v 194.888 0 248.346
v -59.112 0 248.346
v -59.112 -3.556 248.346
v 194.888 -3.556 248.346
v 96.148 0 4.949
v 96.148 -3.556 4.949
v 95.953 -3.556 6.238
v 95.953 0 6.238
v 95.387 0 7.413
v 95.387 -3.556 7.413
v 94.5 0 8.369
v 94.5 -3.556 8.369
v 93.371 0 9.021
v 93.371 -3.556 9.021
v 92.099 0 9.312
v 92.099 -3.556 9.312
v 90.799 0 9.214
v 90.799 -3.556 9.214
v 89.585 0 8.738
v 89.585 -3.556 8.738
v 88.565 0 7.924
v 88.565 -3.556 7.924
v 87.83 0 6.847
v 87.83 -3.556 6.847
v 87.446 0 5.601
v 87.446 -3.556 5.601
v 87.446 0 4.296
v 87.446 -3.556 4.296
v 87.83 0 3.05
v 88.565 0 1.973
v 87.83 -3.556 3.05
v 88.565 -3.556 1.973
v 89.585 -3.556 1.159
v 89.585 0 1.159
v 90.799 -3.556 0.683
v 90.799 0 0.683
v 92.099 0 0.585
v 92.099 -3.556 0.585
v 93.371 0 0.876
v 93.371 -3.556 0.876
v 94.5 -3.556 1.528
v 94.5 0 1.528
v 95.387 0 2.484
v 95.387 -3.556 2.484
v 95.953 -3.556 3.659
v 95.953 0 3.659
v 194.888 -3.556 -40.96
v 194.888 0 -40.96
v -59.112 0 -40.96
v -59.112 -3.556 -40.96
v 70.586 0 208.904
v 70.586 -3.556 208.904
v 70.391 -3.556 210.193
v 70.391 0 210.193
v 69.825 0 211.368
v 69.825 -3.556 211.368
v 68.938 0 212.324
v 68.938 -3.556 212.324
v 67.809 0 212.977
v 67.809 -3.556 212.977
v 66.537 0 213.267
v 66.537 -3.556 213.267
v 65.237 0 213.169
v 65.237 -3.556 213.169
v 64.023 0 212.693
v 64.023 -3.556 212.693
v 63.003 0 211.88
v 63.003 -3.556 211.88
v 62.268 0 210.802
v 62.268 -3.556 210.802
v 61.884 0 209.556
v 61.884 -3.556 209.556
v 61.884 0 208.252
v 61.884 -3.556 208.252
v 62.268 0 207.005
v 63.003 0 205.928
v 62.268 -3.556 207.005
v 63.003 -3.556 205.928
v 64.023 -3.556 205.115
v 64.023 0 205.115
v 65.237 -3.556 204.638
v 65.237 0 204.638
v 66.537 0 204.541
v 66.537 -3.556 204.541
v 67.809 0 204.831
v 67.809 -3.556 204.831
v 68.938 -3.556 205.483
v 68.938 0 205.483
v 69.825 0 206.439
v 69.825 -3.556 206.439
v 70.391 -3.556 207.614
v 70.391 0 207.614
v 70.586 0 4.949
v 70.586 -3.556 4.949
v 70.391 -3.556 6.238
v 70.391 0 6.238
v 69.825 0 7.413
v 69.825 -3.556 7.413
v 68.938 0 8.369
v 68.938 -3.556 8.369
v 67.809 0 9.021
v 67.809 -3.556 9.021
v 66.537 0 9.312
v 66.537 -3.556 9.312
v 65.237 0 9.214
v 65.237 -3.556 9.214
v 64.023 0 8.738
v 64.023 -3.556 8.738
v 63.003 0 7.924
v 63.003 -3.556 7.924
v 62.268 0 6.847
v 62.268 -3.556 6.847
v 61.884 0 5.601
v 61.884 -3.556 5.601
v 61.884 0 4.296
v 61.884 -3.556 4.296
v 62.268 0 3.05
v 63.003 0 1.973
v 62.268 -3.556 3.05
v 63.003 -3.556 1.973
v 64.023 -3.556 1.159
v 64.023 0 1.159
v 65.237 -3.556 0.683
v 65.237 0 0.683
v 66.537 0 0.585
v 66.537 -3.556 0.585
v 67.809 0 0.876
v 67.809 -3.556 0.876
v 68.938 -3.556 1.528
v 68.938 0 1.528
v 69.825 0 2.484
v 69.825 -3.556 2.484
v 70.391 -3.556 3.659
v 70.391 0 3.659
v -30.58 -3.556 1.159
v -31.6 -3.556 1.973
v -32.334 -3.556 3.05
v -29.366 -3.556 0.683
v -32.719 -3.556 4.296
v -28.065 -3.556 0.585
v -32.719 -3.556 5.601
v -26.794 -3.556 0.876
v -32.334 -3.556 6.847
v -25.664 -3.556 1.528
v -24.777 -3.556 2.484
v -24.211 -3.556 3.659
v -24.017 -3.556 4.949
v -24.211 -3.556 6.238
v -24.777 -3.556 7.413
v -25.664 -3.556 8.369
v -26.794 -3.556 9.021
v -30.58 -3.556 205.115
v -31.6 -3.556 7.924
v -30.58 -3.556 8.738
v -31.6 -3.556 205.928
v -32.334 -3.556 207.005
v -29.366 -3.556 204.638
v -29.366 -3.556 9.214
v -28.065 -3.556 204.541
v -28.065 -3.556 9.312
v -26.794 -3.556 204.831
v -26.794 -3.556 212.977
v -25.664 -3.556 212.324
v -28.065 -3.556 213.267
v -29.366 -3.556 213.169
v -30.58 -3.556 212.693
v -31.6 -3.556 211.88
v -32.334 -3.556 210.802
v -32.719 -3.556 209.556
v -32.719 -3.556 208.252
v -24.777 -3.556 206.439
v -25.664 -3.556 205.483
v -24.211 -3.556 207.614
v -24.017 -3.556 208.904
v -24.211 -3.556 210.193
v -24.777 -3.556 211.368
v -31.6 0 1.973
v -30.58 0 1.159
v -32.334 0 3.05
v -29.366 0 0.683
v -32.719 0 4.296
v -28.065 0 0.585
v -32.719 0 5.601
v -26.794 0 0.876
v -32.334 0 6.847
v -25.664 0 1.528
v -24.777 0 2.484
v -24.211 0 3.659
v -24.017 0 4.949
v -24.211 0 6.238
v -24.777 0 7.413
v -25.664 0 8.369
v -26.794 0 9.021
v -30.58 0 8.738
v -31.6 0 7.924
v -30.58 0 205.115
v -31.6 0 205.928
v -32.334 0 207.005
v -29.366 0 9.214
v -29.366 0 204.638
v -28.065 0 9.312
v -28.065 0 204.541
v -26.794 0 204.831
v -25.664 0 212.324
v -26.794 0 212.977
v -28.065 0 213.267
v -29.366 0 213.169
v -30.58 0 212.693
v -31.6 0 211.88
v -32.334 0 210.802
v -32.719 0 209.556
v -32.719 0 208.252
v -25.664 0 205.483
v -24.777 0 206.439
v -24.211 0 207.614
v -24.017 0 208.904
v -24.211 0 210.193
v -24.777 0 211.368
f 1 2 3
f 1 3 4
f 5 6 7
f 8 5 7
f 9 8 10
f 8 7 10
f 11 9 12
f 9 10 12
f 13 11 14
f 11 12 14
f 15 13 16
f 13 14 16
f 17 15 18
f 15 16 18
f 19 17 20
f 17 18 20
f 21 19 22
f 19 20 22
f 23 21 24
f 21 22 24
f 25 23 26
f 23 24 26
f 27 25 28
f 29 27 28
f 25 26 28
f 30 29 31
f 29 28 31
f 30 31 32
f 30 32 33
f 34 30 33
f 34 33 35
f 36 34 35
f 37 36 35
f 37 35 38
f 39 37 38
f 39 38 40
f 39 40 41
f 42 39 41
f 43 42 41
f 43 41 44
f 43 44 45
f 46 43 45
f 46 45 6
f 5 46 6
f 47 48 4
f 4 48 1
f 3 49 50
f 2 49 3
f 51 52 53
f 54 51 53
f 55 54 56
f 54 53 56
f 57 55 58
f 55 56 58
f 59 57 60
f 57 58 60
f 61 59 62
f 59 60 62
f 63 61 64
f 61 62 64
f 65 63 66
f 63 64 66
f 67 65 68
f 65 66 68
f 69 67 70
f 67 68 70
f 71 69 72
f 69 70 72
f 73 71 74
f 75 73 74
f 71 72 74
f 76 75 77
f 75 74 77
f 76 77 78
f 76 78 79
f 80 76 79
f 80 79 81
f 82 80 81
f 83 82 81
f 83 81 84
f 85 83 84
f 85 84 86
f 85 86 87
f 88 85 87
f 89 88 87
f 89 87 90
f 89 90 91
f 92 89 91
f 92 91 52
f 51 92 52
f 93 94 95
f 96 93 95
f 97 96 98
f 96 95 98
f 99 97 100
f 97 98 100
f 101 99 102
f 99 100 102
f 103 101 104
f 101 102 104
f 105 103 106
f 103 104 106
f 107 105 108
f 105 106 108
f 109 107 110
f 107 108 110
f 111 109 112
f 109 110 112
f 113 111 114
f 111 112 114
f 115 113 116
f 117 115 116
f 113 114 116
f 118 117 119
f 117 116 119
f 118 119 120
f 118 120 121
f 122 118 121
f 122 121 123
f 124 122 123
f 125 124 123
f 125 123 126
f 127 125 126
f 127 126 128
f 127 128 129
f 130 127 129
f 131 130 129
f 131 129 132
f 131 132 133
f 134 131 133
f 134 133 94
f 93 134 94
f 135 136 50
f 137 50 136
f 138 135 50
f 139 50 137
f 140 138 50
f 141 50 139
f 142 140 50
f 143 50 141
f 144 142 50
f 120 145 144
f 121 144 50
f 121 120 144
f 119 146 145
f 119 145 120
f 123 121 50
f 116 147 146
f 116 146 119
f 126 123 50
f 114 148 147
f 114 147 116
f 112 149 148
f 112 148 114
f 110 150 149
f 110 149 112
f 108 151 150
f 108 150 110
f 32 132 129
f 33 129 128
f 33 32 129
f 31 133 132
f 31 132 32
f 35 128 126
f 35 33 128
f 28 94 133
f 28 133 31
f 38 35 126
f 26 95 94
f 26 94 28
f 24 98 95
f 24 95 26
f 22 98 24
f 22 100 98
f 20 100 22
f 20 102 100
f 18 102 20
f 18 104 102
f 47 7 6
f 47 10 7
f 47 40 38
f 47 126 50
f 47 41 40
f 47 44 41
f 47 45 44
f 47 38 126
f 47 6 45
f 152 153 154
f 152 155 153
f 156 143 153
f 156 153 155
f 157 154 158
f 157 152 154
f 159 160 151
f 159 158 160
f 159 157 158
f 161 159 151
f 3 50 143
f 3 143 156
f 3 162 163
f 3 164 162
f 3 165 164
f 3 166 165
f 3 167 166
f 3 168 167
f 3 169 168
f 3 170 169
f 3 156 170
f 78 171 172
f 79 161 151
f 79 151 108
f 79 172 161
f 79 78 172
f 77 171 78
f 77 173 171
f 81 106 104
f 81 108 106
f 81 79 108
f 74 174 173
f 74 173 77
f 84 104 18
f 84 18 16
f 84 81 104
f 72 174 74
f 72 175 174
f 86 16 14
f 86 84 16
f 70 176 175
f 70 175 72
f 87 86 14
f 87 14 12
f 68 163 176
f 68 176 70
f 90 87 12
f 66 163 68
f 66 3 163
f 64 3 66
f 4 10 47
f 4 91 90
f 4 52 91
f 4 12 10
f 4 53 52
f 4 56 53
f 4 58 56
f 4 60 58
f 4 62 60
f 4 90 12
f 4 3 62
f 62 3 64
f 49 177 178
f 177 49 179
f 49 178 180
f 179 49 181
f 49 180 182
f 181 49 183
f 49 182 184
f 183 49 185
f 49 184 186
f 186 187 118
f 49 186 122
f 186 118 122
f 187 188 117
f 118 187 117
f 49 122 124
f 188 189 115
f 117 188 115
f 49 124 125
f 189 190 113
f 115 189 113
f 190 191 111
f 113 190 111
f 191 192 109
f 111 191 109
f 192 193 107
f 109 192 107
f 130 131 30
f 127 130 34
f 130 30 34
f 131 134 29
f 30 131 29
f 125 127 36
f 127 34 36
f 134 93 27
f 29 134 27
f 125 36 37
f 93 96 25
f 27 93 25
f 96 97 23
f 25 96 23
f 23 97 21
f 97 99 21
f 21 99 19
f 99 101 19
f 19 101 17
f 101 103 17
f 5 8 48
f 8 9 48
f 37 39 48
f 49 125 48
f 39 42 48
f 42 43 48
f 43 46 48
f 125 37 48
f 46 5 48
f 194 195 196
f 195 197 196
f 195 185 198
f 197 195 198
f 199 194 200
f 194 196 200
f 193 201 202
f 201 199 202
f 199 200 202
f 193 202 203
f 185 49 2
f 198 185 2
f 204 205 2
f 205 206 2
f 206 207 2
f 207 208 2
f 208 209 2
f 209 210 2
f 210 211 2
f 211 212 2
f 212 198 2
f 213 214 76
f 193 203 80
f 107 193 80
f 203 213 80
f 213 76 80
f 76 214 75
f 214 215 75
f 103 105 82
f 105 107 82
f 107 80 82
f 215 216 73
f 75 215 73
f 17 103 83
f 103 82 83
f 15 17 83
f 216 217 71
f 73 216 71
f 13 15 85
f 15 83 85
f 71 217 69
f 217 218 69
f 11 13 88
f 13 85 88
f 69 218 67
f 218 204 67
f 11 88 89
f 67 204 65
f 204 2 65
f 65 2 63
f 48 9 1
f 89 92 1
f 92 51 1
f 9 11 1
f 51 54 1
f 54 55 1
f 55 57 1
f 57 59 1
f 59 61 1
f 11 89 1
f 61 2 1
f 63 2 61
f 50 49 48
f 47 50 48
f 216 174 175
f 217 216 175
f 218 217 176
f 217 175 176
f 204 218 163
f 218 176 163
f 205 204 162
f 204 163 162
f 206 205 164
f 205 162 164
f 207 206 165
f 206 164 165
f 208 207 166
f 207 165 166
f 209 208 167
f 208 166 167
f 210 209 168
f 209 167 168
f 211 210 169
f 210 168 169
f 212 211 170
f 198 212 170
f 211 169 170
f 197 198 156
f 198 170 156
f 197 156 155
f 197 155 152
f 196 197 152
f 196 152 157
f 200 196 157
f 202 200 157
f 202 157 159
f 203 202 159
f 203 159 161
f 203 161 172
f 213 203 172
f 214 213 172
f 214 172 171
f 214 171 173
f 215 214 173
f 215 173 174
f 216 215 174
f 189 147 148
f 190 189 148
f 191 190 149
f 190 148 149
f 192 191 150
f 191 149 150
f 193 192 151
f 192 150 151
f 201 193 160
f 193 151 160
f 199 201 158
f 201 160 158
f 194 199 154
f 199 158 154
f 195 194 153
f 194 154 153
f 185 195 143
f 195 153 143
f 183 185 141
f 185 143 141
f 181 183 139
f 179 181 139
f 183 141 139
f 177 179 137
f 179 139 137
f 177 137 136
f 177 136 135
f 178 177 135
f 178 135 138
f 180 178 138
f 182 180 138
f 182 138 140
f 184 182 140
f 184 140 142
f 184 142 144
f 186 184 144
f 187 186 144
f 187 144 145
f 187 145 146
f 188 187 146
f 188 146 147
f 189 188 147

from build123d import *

# Parameters (mm, degrees)
F0_W     = 254
F0_H     = 289.306
F1_DEPTH = 3.556
F2_R     = 4.375282
F3_DEPTH = 25.4
F4_DEPTH = 25.4


with BuildPart() as f1:
    # F0 (on Front) → F1 (new body)
    with BuildSketch(Plane.XZ):
        with Locations((67.888133, 103.692655)):
            Rectangle(F0_W, F0_H)
    extrude(amount=F1_DEPTH)

    # F2 (on face) → F3 (cut)
    with BuildSketch(Plane.XZ.offset(3.556)):
        with Locations((-28.39225, 4.948523)):
            Circle(F2_R)
    extrude(amount=-F3_DEPTH, mode=Mode.SUBTRACT)

    # F2 (on face) → F4 (cut)
    with BuildSketch(Plane.XZ.offset(3.556)):
        with Locations((-28.39225, 4.948523)):
            Circle(F2_R)
        with Locations((-28.39225, 208.903685)):
            Circle(F2_R)
        with Locations((66.210382, 4.948523)):
            Circle(F2_R)
        with Locations((66.210382, 208.903685)):
            Circle(F2_R)
        with Locations((91.772243, 4.948523)):
            Circle(F2_R)
    extrude(amount=-F4_DEPTH, mode=Mode.SUBTRACT)


solid = f1.part
